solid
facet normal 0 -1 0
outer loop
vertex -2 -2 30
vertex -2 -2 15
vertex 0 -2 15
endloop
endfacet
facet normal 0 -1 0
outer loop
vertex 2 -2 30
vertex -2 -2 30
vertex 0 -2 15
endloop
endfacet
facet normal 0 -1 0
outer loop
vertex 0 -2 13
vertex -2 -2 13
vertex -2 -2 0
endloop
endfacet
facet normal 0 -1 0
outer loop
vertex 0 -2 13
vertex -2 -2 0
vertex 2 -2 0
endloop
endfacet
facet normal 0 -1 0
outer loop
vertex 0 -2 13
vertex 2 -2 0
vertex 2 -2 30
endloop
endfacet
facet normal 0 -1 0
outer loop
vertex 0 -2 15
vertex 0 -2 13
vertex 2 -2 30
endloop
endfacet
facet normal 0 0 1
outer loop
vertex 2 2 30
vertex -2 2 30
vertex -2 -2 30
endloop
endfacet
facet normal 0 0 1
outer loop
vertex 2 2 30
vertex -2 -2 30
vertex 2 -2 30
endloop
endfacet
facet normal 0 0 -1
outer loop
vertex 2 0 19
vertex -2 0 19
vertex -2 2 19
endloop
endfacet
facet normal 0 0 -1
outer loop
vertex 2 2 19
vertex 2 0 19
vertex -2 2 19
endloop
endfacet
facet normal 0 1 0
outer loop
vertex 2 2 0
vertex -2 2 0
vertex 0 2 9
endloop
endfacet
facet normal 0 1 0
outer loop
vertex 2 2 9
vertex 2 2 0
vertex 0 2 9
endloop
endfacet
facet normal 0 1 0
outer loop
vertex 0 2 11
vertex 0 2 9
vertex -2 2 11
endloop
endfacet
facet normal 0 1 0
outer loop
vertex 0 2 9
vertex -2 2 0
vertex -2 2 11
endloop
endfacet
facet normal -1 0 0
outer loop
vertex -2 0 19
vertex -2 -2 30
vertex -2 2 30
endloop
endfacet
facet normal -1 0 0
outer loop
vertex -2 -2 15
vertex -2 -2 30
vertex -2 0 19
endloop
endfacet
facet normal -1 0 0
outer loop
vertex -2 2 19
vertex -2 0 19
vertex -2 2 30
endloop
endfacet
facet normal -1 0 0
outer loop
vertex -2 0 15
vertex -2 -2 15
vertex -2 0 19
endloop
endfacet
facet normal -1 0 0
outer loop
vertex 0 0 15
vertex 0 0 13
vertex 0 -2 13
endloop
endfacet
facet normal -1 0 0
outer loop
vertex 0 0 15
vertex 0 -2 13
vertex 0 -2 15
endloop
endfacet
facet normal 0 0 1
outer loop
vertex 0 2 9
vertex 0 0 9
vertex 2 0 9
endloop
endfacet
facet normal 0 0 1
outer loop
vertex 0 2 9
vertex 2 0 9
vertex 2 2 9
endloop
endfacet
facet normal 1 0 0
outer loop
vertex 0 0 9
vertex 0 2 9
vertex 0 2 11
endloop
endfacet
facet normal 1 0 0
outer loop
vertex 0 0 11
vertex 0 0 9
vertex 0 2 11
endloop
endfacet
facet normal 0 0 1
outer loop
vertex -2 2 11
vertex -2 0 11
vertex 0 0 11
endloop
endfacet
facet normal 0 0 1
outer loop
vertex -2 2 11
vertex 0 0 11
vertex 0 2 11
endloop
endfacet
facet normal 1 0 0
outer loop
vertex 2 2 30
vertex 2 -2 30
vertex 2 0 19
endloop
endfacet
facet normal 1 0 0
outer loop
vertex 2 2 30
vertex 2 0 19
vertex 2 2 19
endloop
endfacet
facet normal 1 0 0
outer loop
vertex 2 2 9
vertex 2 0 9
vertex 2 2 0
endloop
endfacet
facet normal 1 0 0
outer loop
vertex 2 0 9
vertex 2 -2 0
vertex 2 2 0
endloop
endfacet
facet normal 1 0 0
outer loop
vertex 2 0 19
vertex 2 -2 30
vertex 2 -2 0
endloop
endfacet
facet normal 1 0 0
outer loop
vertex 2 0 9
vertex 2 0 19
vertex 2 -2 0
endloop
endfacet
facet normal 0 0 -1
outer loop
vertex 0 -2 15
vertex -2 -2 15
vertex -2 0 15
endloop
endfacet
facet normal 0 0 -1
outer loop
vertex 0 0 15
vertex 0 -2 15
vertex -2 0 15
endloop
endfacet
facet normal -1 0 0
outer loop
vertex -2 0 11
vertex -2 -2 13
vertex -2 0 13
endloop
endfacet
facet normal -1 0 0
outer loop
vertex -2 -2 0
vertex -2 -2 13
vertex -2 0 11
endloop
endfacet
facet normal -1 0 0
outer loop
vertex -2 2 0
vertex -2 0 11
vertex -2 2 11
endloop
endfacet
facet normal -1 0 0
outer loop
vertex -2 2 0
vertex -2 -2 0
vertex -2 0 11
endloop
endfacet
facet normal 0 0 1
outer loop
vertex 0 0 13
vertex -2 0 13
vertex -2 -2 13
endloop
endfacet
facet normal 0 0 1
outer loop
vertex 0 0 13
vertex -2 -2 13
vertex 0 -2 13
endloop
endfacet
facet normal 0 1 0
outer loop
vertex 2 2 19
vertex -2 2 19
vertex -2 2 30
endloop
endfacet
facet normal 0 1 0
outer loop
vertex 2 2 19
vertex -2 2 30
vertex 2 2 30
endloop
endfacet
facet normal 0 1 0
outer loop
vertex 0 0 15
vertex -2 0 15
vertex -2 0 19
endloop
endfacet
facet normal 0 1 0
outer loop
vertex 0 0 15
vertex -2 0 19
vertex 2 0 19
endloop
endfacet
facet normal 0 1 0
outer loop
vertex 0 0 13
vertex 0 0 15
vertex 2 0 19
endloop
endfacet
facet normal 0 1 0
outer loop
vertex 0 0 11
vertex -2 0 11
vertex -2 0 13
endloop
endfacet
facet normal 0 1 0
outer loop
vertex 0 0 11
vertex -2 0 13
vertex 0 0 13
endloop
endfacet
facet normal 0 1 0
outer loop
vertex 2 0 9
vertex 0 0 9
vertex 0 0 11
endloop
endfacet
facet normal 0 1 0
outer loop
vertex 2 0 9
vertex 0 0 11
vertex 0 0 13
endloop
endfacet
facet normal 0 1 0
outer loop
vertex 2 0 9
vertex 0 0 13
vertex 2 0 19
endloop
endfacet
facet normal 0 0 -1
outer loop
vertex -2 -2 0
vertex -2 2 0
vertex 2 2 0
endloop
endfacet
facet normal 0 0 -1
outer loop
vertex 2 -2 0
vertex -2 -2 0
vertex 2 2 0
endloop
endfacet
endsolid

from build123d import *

# Parameters (mm, degrees)
SKETCH_1_W          = 4
SKETCH_1_H          = 4
EXTRUDE_1_DEPTH     = 30
SKETCH_4_W          = 10
SKETCH_4_H          = 2
CUT_EXTRUDE_1_DEPTH = 4
SKETCH_6_W          = 4
SKETCH_6_H          = 2
CUT_EXTRUDE_2_DEPTH = 2
SKETCH_8_W          = 2
SKETCH_8_H          = 2
EXTRUDE_4_DEPTH     = 2
SKETCH_10_W         = 2
SKETCH_10_H         = 2
EXTRUDE_6_DEPTH     = 2


with BuildPart() as part:
    # 草圖1 → 填料-伸長1 (new body)
    with BuildSketch(Plane.XY):
        Rectangle(SKETCH_1_W, SKETCH_1_H)
    extrude(amount=EXTRUDE_1_DEPTH)

    # 草圖4 → 除料-伸長1 (cut)
    with BuildSketch(Plane.ZY.offset(2)):
        with Locations((14, 1)):
            Rectangle(SKETCH_4_W, SKETCH_4_H)
    extrude(amount=-CUT_EXTRUDE_1_DEPTH, mode=Mode.SUBTRACT)

    # 草圖6 → 除料-伸長2 (cut)
    with BuildSketch(Plane.ZY.offset(2)):
        with Locations((13, -1)):
            Rectangle(SKETCH_6_W, SKETCH_6_H)
    extrude(amount=-CUT_EXTRUDE_2_DEPTH, mode=Mode.SUBTRACT)

    # 草圖8 → 填料-伸長4 (add)
    with BuildSketch(Plane.ZY.offset(2)):
        with Locations((10, 1)):
            Rectangle(SKETCH_8_W, SKETCH_8_H)
    extrude(amount=-EXTRUDE_4_DEPTH)

    # 草圖10 → 填料-伸長6 (add)
    with BuildSketch(Plane.XY.offset(11)):
        with Locations((-1, -1)):
            Rectangle(SKETCH_10_W, SKETCH_10_H)
    extrude(amount=EXTRUDE_6_DEPTH)


solid = part.part
